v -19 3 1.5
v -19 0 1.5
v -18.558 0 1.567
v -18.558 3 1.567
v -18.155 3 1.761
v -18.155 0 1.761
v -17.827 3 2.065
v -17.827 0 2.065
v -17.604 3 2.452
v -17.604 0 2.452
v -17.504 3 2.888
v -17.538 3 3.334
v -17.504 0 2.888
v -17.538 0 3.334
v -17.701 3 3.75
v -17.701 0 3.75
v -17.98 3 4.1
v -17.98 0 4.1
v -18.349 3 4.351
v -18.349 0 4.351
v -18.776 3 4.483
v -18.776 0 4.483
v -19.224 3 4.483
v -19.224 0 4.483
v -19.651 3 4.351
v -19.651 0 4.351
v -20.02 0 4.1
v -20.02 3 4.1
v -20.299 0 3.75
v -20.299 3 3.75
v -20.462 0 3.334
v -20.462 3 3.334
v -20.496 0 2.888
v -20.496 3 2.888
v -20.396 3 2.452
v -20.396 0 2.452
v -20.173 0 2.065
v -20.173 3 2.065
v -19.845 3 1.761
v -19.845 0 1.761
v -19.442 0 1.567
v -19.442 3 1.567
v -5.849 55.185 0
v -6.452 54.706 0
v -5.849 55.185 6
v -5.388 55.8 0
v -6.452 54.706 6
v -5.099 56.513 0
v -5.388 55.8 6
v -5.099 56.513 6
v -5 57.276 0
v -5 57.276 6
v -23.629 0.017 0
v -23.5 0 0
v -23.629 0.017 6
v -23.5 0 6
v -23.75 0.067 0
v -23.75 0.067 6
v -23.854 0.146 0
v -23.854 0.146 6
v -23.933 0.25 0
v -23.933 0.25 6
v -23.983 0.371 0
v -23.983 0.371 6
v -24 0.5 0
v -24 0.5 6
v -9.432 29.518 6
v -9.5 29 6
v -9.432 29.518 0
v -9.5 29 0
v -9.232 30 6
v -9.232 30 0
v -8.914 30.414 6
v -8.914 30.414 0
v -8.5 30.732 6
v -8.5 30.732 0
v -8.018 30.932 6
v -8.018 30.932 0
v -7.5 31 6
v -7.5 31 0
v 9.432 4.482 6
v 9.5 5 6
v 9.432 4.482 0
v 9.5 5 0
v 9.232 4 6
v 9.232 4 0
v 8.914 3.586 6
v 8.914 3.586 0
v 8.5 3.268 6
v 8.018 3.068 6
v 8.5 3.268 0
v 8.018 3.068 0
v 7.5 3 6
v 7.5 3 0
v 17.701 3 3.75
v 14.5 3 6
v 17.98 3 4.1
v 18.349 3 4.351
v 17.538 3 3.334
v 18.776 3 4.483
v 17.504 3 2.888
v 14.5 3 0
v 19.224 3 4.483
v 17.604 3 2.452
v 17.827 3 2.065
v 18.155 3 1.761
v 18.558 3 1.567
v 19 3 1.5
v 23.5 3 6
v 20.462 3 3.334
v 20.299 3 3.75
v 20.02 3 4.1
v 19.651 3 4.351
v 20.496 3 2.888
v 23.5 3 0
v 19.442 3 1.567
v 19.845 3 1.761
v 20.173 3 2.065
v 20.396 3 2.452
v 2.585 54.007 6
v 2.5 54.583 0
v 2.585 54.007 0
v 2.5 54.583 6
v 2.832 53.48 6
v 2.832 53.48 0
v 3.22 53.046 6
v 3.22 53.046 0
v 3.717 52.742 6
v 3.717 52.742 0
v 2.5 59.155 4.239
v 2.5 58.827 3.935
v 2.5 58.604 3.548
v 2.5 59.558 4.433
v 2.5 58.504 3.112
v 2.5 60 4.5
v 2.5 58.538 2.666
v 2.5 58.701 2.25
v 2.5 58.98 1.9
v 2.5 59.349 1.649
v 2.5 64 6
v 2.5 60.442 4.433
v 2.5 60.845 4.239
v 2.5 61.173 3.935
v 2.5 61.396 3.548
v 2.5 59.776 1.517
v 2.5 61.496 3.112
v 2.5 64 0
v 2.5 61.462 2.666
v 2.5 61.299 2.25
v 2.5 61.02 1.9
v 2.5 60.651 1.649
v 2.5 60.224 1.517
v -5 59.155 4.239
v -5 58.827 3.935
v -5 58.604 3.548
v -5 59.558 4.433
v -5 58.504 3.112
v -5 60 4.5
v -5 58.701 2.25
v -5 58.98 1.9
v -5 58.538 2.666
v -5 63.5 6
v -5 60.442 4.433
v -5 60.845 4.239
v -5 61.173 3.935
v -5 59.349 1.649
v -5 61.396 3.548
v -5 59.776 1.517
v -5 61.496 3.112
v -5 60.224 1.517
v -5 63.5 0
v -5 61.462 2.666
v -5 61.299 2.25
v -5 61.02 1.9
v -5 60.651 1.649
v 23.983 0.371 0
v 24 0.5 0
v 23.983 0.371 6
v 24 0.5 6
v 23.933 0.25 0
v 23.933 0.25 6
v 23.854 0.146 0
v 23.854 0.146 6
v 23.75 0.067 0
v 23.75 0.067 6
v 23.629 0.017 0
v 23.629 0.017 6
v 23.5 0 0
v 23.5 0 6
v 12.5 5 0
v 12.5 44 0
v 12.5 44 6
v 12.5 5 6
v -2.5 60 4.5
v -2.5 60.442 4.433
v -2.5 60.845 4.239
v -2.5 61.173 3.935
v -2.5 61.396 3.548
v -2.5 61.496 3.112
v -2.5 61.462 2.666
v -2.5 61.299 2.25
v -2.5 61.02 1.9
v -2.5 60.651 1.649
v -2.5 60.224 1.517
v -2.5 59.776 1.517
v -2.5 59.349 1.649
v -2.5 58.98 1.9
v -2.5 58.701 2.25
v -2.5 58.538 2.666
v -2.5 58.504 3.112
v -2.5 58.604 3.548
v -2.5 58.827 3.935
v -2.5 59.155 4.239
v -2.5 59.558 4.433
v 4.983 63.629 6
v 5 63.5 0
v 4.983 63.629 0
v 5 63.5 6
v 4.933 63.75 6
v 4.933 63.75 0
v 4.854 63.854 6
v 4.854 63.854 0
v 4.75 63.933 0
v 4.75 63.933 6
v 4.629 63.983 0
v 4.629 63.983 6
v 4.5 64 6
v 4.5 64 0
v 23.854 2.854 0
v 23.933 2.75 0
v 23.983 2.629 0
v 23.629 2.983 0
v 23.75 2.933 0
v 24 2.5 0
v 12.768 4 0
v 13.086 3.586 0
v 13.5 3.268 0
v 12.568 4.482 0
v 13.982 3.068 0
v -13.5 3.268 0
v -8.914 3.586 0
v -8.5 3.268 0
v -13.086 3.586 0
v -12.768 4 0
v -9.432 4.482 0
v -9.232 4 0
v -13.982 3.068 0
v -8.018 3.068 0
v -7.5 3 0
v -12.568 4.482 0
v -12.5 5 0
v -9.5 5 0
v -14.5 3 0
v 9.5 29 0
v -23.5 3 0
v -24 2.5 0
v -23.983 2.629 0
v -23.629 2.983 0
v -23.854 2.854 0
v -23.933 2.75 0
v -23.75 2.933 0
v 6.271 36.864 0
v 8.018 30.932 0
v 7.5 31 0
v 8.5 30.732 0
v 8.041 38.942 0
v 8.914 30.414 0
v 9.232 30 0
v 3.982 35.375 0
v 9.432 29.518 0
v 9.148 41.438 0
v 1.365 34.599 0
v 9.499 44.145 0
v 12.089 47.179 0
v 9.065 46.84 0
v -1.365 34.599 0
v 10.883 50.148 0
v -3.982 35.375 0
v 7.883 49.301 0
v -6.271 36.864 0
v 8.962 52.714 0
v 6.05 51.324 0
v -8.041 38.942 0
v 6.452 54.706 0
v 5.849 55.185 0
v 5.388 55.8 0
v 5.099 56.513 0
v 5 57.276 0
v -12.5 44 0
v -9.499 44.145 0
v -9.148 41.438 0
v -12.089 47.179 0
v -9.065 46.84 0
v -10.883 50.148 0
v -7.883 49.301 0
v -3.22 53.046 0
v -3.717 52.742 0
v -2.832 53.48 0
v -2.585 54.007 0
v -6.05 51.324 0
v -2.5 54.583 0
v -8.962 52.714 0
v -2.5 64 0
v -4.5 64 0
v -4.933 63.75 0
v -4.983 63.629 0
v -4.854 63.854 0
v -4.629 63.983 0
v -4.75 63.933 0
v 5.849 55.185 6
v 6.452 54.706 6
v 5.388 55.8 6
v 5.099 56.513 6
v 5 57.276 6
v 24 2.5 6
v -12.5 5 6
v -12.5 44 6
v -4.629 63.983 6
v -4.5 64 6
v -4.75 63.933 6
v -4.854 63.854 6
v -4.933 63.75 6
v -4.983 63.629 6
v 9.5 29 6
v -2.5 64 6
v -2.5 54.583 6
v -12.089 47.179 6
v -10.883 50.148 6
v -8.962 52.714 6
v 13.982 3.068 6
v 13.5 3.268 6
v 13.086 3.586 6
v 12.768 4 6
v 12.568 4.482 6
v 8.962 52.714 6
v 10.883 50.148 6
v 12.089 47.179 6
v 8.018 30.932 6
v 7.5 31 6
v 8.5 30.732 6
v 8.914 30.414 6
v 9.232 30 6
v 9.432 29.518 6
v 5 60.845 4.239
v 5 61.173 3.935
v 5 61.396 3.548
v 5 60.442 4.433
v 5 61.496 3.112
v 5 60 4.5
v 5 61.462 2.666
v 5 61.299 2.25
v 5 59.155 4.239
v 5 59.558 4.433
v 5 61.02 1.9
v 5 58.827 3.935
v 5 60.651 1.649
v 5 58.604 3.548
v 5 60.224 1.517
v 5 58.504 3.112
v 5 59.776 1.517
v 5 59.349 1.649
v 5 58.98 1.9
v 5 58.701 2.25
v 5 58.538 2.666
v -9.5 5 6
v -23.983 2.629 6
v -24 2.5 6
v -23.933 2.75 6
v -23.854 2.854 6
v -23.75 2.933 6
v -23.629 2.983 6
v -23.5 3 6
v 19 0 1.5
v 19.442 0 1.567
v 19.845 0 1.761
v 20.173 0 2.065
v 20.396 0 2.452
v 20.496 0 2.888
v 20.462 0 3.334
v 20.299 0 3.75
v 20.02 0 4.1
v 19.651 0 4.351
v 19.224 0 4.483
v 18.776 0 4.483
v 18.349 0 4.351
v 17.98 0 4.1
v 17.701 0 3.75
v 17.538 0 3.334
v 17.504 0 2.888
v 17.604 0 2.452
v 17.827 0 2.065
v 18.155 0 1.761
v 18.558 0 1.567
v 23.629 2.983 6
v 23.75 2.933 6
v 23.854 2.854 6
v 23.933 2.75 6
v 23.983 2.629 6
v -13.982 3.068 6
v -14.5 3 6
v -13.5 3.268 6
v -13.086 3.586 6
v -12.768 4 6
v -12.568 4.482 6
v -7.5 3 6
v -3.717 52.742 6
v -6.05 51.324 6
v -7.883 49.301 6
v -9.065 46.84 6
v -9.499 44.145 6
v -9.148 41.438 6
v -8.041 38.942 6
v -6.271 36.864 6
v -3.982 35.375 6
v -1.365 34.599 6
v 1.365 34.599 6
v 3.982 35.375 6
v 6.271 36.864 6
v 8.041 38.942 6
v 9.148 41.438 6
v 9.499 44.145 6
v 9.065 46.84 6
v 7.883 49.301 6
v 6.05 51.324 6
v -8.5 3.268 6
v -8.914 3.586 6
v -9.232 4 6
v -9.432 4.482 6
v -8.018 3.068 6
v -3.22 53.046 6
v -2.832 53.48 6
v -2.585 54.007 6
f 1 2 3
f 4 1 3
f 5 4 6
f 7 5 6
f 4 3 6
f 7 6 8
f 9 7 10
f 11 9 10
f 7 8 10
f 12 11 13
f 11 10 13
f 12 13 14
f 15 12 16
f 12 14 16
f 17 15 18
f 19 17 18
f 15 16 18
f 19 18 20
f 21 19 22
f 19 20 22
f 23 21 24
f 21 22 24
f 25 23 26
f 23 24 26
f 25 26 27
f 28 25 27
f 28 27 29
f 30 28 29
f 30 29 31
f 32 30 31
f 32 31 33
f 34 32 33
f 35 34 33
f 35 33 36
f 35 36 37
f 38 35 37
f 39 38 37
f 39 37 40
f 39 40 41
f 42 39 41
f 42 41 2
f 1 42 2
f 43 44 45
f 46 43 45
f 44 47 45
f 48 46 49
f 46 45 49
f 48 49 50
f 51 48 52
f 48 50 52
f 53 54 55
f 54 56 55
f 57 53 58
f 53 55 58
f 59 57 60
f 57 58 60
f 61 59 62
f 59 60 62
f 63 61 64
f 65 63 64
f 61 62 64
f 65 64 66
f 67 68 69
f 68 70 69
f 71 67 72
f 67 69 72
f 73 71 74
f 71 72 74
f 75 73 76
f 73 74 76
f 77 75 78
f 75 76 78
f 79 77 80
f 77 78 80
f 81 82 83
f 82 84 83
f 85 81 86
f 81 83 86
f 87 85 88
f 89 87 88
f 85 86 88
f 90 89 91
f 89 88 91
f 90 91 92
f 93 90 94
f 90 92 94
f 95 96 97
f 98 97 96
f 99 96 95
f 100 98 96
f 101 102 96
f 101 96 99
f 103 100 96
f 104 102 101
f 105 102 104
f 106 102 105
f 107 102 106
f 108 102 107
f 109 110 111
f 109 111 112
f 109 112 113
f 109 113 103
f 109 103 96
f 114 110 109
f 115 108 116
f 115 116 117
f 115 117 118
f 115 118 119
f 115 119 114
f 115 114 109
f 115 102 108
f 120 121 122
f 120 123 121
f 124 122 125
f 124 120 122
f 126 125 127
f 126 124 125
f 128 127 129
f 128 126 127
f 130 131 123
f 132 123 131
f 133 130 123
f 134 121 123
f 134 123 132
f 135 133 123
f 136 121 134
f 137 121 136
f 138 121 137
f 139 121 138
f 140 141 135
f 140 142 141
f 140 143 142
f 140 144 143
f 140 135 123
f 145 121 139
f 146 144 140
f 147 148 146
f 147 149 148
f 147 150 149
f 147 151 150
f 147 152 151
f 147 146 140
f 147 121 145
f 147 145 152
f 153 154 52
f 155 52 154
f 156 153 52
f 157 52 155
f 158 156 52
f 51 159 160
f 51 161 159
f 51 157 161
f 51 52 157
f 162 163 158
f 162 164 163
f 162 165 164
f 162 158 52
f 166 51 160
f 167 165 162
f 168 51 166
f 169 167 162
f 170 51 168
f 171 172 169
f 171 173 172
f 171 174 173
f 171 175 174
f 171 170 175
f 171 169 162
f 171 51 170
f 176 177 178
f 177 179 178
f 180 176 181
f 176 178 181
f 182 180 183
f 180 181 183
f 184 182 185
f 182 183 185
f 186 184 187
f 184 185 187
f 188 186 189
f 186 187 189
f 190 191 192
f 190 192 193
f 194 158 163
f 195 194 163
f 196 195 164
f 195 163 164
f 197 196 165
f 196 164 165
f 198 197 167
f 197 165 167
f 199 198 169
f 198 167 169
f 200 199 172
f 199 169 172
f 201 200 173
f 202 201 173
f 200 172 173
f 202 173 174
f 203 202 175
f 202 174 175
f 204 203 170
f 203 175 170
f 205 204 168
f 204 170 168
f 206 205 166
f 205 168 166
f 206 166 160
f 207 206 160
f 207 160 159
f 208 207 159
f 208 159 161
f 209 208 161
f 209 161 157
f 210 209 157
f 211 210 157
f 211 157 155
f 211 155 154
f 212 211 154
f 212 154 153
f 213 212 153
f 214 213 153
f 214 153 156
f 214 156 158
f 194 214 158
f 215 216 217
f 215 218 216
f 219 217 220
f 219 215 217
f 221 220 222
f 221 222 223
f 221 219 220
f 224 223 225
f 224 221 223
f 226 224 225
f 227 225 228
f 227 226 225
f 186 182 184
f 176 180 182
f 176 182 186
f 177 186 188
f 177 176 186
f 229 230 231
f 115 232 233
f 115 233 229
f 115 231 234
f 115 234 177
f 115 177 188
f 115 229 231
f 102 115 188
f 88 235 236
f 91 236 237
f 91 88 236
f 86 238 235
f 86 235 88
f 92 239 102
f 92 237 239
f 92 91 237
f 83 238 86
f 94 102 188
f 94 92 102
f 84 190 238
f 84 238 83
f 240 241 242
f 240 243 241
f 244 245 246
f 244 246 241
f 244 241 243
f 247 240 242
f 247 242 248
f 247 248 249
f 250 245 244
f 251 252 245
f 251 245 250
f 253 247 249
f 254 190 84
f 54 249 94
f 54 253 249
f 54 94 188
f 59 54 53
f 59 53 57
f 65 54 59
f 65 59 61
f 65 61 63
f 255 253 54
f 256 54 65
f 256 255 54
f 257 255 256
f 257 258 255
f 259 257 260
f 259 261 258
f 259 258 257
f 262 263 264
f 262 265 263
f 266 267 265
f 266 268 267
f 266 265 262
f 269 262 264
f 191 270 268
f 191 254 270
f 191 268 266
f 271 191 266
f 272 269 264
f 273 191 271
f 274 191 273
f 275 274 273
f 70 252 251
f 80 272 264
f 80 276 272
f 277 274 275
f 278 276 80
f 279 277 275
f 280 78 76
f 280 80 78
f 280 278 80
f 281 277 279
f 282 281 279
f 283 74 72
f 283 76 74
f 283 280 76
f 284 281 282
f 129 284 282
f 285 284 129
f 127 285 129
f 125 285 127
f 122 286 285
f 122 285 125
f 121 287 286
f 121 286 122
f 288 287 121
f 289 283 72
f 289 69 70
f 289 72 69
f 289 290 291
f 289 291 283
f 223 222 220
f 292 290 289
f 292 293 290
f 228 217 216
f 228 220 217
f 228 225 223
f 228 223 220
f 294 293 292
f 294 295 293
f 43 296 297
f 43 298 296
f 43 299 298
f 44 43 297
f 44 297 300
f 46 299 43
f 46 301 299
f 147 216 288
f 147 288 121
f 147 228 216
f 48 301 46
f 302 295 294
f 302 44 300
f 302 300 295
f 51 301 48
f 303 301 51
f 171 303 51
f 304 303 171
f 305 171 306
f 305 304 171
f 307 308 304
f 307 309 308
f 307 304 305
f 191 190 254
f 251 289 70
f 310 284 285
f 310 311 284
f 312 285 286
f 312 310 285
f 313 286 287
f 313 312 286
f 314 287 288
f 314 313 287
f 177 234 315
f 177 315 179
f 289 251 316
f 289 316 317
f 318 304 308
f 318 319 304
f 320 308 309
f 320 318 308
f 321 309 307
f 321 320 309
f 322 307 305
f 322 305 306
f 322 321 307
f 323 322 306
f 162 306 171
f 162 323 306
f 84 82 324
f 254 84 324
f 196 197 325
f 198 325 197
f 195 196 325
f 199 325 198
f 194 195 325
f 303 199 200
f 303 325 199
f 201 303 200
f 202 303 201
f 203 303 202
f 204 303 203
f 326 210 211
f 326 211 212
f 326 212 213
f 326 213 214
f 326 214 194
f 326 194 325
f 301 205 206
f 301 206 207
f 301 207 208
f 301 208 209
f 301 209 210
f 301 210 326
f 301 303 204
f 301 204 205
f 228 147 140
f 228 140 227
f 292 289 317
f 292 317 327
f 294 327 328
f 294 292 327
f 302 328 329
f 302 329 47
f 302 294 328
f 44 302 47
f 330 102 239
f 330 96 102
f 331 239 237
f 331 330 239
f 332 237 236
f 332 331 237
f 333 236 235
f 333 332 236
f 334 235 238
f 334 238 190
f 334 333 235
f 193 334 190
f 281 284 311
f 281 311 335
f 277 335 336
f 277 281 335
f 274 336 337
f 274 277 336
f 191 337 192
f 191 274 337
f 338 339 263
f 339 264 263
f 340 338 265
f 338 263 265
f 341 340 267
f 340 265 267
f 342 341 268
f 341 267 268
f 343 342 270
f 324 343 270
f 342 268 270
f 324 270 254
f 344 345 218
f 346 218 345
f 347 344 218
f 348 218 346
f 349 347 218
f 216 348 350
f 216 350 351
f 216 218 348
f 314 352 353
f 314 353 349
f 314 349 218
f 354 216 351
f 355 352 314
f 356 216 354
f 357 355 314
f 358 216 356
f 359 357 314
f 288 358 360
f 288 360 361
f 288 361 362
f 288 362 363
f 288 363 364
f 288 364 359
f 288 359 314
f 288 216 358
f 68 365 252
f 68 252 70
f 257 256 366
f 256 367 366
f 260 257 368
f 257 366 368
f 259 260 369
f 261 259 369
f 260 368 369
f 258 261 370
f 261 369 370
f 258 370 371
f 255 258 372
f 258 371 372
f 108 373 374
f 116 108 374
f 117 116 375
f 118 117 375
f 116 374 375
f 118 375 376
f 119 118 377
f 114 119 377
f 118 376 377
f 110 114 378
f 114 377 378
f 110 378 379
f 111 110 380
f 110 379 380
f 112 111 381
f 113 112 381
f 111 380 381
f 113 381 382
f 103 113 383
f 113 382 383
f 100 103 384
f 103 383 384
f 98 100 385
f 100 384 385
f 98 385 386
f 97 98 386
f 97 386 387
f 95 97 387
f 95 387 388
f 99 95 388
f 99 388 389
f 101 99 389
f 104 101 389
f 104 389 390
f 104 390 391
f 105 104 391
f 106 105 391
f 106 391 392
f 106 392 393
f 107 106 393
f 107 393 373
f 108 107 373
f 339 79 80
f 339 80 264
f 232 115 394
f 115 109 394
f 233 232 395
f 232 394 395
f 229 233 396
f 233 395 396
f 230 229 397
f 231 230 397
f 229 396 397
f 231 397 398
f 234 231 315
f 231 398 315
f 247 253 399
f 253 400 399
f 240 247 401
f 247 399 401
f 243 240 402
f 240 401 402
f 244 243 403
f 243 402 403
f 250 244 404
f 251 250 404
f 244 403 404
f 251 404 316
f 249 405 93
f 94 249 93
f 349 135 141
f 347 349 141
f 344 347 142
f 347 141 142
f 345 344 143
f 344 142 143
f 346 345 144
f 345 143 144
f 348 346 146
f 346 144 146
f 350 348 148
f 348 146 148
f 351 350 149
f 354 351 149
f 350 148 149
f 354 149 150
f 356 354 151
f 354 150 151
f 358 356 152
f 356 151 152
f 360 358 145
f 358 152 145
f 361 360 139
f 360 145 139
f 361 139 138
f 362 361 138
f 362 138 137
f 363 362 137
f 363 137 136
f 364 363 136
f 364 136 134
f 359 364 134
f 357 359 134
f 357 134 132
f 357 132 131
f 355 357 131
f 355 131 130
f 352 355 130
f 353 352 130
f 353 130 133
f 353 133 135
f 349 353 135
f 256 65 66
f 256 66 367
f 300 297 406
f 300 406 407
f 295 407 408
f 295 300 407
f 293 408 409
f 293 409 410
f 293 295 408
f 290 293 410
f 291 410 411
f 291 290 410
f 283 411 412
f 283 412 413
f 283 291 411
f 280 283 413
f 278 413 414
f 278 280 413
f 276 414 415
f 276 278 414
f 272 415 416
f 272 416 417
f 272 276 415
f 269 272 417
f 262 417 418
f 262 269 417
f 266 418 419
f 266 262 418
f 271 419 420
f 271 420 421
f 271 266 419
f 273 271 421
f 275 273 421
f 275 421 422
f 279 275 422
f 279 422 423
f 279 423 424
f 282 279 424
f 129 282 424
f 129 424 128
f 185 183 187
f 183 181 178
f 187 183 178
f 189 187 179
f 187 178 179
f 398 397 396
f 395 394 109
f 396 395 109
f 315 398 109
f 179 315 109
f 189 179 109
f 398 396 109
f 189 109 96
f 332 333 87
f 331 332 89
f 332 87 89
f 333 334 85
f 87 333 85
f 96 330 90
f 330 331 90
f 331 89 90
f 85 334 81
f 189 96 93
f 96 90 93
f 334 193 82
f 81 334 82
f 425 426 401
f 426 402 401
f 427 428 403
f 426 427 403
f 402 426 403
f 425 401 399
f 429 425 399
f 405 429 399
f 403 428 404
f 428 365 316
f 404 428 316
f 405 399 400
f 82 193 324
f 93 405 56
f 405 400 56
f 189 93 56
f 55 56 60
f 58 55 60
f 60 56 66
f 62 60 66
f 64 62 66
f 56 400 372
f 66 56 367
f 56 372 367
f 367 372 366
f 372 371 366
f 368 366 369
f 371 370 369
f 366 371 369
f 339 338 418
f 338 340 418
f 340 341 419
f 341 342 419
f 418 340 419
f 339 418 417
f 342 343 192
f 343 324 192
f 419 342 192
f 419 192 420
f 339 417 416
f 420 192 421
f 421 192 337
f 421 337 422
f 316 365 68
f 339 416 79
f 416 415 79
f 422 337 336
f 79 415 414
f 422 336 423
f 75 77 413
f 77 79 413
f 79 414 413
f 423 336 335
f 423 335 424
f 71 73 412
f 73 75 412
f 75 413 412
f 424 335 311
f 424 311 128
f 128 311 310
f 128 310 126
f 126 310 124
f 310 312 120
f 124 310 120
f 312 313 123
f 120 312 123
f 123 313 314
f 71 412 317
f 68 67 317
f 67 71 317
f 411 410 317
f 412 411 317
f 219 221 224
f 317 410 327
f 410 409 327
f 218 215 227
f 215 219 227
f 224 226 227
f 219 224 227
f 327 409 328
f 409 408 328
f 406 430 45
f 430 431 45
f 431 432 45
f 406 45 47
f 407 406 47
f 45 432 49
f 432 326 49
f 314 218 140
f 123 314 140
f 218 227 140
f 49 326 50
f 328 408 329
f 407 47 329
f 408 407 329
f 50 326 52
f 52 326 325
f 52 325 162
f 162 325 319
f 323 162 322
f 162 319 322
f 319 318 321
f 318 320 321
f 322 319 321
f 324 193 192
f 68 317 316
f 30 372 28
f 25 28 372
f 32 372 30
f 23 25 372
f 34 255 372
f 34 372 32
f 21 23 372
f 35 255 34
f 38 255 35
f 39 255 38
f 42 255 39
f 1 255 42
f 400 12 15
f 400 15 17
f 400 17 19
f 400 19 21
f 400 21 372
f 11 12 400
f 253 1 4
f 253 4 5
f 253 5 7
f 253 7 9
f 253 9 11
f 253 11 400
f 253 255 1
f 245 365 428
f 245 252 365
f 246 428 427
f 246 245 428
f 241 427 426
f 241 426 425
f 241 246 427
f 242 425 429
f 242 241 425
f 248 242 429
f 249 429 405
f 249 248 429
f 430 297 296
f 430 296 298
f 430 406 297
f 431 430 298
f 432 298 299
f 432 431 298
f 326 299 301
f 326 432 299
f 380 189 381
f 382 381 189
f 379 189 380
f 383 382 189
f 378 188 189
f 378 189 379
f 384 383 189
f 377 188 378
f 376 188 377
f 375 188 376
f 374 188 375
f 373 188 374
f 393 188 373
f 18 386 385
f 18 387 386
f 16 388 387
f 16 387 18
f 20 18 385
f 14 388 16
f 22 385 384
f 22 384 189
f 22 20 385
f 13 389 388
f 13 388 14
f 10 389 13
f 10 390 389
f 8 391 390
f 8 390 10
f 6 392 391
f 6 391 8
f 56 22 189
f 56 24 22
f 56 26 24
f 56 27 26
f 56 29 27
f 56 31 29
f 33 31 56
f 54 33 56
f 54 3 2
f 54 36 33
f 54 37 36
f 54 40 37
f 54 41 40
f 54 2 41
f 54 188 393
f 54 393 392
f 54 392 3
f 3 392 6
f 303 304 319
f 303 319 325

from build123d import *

# Parameters (mm, degrees)
EXTRUDE_1_DEPTH     = 6
SKETCH_2_W          = 19
SKETCH_2_H          = 28
CUT_EXTRUDE_1_DEPTH = 6
FILLET_2_R          = 2
FILLET_3_R          = 2
SKETCH_3_R          = 1.5
CUT_EXTRUDE_2_DEPTH = 6
FILLET_4_R          = 3
FILLET_5_R          = 0.5
SKETCH_4_R          = 1.5
CUT_EXTRUDE_3_DEPTH = 14
FILLET_6_R          = 2


with BuildPart() as part:
    # 草图1 → 凸台-拉伸1 (new body)
    with BuildSketch(Plane.XY):
        with BuildLine():
            Line((12.5, 3), (24, 3))
            Line((24, 3), (24, 0))
            Line((24, 0), (-24, 0))
            Line((-24, 0), (-24, 3))
            Line((-24, 3), (-12.5, 3))
            Line((-12.5, 3), (-12.5, 44))
            ThreePointArc((-12.5, 44), (-10.458250332, 50.846531969), (-5, 55.456439237))
            Line((-5, 55.456439237), (-5, 64))
            Line((-5, 64), (-2.5, 64))
            Line((-2.5, 64), (-2.5, 53.16515139))
            ThreePointArc((-2.5, 53.16515139), (0, 34.5), (2.5, 53.16515139))
            Line((2.5, 53.16515139), (2.5, 64))
            Line((2.5, 64), (5, 64))
            Line((5, 64), (5, 55.456439237))
            ThreePointArc((5, 55.456439237), (10.458250332, 50.846531969), (12.5, 44))
            Line((12.5, 44), (12.5, 3))
        make_face()
    extrude(amount=EXTRUDE_1_DEPTH)

    # 草图2 → 切除-拉伸1 (cut)
    with BuildSketch(Plane.XY.offset(6)):
        with Locations((0, 17)):
            Rectangle(SKETCH_2_W, SKETCH_2_H)
    extrude(amount=-CUT_EXTRUDE_1_DEPTH, mode=Mode.SUBTRACT)

    # 圆角2
    fillet_2_edges = [part.edges().sort_by_distance(p)[0] for p in [
        (-9.5, 3, 3),
        (-9.5, 31, 3),
        (9.5, 31, 3),
        (9.5, 3, 3),
    ]]
    fillet(fillet_2_edges, radius=FILLET_2_R)

    # 圆角3
    fillet_3_edges = [part.edges().sort_by_distance(p)[0] for p in [
        (12.5, 3, 3),
        (-12.5, 3, 3),
    ]]
    fillet(fillet_3_edges, radius=FILLET_3_R)

    # 草图3 → 切除-拉伸2 (cut)
    with BuildSketch(Plane.XZ):
        with Locations(Location((-19, 3, 0), (0, 0, 270))):
            Circle(SKETCH_3_R)
        with Locations(Location((19, 3, 0), (0, 0, 270))):
            Circle(SKETCH_3_R)
    extrude(amount=-CUT_EXTRUDE_2_DEPTH, mode=Mode.SUBTRACT)

    # 圆角4
    fillet_4_edges = [part.edges().sort_by_distance(p)[0] for p in [
        (5, 55.456439237, 3),
        (-5, 55.456439237, 3),
    ]]
    fillet(fillet_4_edges, radius=FILLET_4_R)

    # 圆角5
    fillet_5_edges = [part.edges().sort_by_distance(p)[0] for p in [
        (5, 64, 3),
        (24, 3, 3),
        (24, 0, 3),
        (-24, 0, 3),
        (-24, 3, 3),
        (-5, 64, 3),
    ]]
    fillet(fillet_5_edges, radius=FILLET_5_R)

    # 草图4 → 切除-拉伸3 (cut)
    with BuildSketch(Plane.ZY.offset(5)):
        with Locations((3, 60)):
            Circle(SKETCH_4_R)
    extrude(amount=-CUT_EXTRUDE_3_DEPTH, mode=Mode.SUBTRACT)

    # 圆角6
    fillet_6_edges = [part.edges().sort_by_distance(p)[0] for p in [
        (2.5, 53.16515139, 3),
        (-2.5, 53.16515139, 3),
    ]]
    fillet(fillet_6_edges, radius=FILLET_6_R)


solid = part.part
